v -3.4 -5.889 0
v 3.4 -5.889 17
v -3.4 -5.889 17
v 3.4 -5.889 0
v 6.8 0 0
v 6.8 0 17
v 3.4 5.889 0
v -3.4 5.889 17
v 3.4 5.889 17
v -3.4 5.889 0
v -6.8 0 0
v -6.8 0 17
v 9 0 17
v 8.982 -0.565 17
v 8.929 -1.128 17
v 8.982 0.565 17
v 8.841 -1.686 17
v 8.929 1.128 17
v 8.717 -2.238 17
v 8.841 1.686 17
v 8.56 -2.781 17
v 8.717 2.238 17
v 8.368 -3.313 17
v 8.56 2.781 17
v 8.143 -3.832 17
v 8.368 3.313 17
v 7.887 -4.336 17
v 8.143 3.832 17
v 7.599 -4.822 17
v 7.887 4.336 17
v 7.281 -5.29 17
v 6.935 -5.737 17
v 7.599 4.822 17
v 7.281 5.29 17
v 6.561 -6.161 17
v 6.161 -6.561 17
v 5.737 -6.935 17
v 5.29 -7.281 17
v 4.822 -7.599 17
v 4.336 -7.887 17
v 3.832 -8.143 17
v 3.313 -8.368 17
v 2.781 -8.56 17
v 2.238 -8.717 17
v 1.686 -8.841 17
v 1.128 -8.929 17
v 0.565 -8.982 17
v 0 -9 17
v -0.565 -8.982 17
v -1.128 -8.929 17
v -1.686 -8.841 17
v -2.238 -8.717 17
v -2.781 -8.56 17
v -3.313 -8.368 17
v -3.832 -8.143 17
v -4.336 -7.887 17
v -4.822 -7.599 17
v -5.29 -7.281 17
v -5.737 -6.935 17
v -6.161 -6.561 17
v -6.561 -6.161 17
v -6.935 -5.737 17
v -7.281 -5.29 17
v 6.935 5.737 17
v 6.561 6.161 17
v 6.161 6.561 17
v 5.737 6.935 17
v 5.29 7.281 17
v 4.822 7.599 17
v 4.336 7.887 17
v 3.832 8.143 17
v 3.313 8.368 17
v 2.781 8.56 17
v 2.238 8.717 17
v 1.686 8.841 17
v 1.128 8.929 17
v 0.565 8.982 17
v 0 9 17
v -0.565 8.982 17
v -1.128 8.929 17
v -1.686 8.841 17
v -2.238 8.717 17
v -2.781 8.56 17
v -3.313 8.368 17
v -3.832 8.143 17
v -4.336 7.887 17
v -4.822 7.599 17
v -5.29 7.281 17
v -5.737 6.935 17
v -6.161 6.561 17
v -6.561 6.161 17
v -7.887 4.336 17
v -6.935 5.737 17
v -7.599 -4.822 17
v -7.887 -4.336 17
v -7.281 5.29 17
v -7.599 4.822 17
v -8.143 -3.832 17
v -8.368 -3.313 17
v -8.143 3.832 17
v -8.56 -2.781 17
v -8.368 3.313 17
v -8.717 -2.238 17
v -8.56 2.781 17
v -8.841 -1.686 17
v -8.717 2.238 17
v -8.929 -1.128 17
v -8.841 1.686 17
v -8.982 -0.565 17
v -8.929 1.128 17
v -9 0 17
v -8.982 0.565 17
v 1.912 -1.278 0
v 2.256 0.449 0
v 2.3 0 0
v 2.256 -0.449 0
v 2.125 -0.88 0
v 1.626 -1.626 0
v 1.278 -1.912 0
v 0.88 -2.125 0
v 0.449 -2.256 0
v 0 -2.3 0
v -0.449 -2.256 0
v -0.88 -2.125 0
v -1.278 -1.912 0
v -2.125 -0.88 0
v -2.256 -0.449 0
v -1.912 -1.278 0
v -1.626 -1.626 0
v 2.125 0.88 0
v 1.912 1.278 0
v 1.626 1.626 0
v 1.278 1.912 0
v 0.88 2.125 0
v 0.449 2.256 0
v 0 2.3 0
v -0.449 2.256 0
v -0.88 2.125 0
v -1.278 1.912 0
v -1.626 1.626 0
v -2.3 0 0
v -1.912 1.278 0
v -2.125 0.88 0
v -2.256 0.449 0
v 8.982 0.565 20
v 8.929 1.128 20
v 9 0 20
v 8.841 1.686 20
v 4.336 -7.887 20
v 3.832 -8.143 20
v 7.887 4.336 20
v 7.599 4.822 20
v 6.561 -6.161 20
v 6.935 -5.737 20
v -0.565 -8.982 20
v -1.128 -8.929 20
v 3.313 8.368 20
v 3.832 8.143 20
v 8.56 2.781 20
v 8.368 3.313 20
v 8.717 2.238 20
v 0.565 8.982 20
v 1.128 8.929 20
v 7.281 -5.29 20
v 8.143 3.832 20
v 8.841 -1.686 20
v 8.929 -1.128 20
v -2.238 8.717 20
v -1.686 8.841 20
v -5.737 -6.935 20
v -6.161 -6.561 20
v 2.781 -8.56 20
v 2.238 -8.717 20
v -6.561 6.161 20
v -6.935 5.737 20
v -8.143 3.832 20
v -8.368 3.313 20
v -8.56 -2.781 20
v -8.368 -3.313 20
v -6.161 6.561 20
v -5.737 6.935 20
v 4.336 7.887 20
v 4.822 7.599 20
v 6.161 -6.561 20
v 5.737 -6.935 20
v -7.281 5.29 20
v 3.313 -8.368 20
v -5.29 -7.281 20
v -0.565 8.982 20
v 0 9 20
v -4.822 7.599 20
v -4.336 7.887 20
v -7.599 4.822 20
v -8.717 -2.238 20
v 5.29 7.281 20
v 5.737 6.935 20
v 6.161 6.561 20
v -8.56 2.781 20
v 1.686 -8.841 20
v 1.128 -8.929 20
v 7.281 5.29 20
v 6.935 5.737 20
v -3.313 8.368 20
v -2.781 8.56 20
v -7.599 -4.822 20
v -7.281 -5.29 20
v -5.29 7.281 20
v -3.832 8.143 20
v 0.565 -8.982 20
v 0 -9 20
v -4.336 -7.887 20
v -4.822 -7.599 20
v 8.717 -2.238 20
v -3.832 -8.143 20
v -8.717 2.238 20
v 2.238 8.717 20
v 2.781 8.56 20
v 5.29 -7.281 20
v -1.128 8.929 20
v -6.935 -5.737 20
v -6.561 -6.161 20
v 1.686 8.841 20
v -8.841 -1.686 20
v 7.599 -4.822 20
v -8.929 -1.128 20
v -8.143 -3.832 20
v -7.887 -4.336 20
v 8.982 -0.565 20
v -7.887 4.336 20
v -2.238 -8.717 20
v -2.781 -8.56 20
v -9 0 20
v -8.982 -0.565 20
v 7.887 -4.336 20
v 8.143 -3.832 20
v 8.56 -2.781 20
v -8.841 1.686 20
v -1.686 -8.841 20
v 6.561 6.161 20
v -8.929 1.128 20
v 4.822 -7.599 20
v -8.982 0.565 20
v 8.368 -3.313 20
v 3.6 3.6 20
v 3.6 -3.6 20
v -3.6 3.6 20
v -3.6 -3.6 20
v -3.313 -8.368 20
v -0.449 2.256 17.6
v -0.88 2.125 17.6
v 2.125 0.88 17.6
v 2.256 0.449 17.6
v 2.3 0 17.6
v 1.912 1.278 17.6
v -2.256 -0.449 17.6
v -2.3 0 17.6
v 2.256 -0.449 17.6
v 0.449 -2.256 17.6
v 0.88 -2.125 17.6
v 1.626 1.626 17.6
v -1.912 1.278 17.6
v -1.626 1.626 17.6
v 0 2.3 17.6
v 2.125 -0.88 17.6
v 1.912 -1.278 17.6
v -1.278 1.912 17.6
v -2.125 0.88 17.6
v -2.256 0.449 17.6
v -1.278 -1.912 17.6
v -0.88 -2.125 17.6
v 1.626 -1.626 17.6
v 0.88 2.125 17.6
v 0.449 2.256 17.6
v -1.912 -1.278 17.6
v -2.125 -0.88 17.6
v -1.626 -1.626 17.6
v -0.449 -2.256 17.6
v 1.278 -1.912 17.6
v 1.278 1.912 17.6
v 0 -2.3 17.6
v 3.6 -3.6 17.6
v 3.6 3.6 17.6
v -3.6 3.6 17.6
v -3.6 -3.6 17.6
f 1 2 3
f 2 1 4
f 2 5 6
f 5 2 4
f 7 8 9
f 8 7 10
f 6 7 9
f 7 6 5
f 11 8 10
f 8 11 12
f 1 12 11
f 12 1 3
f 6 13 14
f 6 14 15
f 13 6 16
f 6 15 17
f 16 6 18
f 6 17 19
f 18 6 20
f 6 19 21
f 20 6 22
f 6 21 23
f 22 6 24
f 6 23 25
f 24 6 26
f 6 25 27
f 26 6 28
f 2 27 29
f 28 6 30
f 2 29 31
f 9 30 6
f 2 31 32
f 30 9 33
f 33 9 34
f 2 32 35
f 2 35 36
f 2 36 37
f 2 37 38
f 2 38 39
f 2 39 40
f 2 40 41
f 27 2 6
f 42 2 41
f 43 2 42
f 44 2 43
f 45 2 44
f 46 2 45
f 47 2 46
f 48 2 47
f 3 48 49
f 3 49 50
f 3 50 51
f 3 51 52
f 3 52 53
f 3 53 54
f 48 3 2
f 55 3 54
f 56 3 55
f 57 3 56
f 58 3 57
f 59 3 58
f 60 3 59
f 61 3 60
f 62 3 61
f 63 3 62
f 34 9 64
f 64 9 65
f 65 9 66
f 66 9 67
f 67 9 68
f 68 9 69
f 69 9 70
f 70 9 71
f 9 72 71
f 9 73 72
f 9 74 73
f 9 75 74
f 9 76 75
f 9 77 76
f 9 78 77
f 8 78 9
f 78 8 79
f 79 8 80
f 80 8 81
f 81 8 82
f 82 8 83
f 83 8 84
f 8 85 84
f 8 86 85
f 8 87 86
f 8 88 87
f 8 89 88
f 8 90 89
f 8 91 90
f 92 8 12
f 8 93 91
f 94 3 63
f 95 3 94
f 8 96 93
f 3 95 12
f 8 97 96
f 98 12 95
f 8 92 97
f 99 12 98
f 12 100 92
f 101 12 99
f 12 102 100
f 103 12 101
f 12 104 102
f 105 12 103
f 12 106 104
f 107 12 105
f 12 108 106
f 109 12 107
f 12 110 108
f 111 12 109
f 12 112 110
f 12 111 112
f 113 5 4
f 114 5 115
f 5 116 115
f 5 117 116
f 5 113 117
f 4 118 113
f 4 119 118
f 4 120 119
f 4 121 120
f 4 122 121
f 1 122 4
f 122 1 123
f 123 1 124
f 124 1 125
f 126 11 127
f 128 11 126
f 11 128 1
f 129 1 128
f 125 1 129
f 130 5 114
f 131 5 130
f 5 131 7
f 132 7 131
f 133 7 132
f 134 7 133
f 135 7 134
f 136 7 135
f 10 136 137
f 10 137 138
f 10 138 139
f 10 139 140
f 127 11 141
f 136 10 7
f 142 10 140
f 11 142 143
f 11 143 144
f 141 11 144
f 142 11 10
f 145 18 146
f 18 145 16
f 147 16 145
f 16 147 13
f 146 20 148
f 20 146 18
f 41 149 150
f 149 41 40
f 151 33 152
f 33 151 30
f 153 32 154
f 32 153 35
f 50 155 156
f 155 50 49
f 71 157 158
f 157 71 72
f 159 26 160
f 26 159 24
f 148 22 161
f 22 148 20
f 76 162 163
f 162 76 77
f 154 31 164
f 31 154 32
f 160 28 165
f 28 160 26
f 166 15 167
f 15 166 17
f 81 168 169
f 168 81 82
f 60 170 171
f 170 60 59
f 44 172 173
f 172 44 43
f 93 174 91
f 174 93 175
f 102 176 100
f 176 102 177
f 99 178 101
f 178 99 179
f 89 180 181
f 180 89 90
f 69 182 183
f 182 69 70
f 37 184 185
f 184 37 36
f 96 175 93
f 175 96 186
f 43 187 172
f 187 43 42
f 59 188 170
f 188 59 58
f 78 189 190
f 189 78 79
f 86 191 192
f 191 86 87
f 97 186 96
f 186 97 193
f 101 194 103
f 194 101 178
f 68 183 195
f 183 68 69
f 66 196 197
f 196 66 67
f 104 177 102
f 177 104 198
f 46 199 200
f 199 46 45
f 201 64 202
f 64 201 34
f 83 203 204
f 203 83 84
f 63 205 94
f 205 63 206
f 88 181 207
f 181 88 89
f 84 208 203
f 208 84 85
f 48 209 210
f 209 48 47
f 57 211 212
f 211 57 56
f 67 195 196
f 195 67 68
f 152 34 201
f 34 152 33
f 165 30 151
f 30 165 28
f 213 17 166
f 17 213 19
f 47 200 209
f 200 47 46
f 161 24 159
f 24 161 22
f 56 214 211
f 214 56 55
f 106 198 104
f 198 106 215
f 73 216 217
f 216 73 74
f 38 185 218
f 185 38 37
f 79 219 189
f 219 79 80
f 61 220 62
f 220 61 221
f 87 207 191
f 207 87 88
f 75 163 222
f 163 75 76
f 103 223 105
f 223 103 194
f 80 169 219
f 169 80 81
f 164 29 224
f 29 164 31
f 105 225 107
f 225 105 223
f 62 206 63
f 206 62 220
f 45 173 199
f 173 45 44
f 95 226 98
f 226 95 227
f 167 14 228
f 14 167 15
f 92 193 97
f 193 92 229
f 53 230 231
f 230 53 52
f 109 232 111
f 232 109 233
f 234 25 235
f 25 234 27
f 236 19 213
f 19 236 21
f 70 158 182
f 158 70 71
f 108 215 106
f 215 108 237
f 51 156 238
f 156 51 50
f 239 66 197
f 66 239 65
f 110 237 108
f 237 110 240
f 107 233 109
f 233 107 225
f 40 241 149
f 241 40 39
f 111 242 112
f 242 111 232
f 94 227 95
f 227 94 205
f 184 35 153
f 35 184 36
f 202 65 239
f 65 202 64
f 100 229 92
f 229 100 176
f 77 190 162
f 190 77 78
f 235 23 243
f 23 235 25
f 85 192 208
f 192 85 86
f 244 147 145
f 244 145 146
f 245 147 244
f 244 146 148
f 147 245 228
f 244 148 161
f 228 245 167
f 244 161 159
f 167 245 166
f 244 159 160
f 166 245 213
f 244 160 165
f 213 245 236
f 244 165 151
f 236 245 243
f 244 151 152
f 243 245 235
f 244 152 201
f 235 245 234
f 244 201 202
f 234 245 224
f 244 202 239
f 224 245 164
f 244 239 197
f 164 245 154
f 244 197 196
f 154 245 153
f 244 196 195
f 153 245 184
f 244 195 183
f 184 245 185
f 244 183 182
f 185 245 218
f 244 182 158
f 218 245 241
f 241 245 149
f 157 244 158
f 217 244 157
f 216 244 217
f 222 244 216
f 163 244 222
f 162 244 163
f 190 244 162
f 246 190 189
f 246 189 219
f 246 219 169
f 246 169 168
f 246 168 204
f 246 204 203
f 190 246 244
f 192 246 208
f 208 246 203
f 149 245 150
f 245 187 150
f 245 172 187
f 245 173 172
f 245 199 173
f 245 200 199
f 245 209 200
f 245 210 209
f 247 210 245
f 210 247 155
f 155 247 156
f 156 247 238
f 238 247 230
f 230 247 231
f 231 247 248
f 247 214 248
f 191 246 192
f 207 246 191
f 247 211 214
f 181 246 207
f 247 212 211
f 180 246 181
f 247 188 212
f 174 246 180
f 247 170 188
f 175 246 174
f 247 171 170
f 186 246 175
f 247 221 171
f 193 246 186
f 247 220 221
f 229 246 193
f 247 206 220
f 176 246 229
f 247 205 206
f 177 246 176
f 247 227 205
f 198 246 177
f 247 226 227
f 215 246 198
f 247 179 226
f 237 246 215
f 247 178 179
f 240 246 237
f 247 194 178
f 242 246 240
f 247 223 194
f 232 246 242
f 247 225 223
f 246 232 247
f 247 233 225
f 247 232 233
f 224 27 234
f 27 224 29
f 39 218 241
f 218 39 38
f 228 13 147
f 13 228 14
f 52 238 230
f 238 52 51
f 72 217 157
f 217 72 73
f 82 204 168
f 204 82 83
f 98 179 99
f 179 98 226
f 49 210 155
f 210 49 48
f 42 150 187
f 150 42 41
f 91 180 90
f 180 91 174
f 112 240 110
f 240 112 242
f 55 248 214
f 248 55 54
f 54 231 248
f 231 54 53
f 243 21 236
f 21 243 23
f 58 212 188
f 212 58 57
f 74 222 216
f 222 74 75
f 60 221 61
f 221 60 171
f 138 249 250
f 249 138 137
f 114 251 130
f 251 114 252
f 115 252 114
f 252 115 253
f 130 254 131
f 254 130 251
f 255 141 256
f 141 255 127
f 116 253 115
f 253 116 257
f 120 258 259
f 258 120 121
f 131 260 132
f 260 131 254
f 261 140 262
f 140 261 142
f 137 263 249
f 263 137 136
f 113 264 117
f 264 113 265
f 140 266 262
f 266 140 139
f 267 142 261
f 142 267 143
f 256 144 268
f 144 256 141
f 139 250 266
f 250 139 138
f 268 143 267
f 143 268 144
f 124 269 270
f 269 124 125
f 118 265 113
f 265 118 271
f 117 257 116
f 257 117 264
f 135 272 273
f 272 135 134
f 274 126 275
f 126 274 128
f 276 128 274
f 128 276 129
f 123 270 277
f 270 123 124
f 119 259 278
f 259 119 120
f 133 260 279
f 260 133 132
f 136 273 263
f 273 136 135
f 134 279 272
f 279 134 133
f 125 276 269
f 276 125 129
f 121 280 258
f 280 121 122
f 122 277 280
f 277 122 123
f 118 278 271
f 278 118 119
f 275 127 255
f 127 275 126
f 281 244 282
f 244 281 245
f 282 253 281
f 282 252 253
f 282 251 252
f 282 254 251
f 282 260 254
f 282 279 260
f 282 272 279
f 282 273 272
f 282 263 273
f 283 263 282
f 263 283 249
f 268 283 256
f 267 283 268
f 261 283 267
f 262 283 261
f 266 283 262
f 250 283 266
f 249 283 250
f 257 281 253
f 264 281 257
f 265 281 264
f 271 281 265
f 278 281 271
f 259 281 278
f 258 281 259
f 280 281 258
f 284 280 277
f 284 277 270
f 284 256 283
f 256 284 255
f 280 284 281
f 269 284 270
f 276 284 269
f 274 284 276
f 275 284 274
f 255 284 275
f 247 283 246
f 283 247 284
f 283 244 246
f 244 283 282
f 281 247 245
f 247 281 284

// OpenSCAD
qs=7;
qh=2;
//translate([0,0,20]) part2();
part1();

module part2() {
    h=10.2;
    difference() {
        union() {
            translate([0,0,-qh]) translate([-qs/2,-qs/2,0]) cube([qs,qs,qh]);
            cylinder($fn=100, d=12.6, h=h);
            translate([0,0,h]) cylinder($fn=100, d=18, h=3);
        }
        translate([0,0,-qh]) cylinder($fn=32, d=4.6, h=h+qh+3);
        translate([0,0,h]) cylinder($fn=6, d=8.6, h=3.5);    
    }
}

module part1() {
    d = 0.2;
    difference() {
        union() {
            cylinder($fn=6, d=13.6, h=17);
            translate([0,0,17]) cylinder($fn=100, d=18, h=3);
        }
        cylinder($fn=32, d=4.6, h=20);
        translate([-qs/2-d/2,-qs/2-d/2,20-qh-2*d]) cube([qs+d,qs+d,qh+d*2]);
    }
}
